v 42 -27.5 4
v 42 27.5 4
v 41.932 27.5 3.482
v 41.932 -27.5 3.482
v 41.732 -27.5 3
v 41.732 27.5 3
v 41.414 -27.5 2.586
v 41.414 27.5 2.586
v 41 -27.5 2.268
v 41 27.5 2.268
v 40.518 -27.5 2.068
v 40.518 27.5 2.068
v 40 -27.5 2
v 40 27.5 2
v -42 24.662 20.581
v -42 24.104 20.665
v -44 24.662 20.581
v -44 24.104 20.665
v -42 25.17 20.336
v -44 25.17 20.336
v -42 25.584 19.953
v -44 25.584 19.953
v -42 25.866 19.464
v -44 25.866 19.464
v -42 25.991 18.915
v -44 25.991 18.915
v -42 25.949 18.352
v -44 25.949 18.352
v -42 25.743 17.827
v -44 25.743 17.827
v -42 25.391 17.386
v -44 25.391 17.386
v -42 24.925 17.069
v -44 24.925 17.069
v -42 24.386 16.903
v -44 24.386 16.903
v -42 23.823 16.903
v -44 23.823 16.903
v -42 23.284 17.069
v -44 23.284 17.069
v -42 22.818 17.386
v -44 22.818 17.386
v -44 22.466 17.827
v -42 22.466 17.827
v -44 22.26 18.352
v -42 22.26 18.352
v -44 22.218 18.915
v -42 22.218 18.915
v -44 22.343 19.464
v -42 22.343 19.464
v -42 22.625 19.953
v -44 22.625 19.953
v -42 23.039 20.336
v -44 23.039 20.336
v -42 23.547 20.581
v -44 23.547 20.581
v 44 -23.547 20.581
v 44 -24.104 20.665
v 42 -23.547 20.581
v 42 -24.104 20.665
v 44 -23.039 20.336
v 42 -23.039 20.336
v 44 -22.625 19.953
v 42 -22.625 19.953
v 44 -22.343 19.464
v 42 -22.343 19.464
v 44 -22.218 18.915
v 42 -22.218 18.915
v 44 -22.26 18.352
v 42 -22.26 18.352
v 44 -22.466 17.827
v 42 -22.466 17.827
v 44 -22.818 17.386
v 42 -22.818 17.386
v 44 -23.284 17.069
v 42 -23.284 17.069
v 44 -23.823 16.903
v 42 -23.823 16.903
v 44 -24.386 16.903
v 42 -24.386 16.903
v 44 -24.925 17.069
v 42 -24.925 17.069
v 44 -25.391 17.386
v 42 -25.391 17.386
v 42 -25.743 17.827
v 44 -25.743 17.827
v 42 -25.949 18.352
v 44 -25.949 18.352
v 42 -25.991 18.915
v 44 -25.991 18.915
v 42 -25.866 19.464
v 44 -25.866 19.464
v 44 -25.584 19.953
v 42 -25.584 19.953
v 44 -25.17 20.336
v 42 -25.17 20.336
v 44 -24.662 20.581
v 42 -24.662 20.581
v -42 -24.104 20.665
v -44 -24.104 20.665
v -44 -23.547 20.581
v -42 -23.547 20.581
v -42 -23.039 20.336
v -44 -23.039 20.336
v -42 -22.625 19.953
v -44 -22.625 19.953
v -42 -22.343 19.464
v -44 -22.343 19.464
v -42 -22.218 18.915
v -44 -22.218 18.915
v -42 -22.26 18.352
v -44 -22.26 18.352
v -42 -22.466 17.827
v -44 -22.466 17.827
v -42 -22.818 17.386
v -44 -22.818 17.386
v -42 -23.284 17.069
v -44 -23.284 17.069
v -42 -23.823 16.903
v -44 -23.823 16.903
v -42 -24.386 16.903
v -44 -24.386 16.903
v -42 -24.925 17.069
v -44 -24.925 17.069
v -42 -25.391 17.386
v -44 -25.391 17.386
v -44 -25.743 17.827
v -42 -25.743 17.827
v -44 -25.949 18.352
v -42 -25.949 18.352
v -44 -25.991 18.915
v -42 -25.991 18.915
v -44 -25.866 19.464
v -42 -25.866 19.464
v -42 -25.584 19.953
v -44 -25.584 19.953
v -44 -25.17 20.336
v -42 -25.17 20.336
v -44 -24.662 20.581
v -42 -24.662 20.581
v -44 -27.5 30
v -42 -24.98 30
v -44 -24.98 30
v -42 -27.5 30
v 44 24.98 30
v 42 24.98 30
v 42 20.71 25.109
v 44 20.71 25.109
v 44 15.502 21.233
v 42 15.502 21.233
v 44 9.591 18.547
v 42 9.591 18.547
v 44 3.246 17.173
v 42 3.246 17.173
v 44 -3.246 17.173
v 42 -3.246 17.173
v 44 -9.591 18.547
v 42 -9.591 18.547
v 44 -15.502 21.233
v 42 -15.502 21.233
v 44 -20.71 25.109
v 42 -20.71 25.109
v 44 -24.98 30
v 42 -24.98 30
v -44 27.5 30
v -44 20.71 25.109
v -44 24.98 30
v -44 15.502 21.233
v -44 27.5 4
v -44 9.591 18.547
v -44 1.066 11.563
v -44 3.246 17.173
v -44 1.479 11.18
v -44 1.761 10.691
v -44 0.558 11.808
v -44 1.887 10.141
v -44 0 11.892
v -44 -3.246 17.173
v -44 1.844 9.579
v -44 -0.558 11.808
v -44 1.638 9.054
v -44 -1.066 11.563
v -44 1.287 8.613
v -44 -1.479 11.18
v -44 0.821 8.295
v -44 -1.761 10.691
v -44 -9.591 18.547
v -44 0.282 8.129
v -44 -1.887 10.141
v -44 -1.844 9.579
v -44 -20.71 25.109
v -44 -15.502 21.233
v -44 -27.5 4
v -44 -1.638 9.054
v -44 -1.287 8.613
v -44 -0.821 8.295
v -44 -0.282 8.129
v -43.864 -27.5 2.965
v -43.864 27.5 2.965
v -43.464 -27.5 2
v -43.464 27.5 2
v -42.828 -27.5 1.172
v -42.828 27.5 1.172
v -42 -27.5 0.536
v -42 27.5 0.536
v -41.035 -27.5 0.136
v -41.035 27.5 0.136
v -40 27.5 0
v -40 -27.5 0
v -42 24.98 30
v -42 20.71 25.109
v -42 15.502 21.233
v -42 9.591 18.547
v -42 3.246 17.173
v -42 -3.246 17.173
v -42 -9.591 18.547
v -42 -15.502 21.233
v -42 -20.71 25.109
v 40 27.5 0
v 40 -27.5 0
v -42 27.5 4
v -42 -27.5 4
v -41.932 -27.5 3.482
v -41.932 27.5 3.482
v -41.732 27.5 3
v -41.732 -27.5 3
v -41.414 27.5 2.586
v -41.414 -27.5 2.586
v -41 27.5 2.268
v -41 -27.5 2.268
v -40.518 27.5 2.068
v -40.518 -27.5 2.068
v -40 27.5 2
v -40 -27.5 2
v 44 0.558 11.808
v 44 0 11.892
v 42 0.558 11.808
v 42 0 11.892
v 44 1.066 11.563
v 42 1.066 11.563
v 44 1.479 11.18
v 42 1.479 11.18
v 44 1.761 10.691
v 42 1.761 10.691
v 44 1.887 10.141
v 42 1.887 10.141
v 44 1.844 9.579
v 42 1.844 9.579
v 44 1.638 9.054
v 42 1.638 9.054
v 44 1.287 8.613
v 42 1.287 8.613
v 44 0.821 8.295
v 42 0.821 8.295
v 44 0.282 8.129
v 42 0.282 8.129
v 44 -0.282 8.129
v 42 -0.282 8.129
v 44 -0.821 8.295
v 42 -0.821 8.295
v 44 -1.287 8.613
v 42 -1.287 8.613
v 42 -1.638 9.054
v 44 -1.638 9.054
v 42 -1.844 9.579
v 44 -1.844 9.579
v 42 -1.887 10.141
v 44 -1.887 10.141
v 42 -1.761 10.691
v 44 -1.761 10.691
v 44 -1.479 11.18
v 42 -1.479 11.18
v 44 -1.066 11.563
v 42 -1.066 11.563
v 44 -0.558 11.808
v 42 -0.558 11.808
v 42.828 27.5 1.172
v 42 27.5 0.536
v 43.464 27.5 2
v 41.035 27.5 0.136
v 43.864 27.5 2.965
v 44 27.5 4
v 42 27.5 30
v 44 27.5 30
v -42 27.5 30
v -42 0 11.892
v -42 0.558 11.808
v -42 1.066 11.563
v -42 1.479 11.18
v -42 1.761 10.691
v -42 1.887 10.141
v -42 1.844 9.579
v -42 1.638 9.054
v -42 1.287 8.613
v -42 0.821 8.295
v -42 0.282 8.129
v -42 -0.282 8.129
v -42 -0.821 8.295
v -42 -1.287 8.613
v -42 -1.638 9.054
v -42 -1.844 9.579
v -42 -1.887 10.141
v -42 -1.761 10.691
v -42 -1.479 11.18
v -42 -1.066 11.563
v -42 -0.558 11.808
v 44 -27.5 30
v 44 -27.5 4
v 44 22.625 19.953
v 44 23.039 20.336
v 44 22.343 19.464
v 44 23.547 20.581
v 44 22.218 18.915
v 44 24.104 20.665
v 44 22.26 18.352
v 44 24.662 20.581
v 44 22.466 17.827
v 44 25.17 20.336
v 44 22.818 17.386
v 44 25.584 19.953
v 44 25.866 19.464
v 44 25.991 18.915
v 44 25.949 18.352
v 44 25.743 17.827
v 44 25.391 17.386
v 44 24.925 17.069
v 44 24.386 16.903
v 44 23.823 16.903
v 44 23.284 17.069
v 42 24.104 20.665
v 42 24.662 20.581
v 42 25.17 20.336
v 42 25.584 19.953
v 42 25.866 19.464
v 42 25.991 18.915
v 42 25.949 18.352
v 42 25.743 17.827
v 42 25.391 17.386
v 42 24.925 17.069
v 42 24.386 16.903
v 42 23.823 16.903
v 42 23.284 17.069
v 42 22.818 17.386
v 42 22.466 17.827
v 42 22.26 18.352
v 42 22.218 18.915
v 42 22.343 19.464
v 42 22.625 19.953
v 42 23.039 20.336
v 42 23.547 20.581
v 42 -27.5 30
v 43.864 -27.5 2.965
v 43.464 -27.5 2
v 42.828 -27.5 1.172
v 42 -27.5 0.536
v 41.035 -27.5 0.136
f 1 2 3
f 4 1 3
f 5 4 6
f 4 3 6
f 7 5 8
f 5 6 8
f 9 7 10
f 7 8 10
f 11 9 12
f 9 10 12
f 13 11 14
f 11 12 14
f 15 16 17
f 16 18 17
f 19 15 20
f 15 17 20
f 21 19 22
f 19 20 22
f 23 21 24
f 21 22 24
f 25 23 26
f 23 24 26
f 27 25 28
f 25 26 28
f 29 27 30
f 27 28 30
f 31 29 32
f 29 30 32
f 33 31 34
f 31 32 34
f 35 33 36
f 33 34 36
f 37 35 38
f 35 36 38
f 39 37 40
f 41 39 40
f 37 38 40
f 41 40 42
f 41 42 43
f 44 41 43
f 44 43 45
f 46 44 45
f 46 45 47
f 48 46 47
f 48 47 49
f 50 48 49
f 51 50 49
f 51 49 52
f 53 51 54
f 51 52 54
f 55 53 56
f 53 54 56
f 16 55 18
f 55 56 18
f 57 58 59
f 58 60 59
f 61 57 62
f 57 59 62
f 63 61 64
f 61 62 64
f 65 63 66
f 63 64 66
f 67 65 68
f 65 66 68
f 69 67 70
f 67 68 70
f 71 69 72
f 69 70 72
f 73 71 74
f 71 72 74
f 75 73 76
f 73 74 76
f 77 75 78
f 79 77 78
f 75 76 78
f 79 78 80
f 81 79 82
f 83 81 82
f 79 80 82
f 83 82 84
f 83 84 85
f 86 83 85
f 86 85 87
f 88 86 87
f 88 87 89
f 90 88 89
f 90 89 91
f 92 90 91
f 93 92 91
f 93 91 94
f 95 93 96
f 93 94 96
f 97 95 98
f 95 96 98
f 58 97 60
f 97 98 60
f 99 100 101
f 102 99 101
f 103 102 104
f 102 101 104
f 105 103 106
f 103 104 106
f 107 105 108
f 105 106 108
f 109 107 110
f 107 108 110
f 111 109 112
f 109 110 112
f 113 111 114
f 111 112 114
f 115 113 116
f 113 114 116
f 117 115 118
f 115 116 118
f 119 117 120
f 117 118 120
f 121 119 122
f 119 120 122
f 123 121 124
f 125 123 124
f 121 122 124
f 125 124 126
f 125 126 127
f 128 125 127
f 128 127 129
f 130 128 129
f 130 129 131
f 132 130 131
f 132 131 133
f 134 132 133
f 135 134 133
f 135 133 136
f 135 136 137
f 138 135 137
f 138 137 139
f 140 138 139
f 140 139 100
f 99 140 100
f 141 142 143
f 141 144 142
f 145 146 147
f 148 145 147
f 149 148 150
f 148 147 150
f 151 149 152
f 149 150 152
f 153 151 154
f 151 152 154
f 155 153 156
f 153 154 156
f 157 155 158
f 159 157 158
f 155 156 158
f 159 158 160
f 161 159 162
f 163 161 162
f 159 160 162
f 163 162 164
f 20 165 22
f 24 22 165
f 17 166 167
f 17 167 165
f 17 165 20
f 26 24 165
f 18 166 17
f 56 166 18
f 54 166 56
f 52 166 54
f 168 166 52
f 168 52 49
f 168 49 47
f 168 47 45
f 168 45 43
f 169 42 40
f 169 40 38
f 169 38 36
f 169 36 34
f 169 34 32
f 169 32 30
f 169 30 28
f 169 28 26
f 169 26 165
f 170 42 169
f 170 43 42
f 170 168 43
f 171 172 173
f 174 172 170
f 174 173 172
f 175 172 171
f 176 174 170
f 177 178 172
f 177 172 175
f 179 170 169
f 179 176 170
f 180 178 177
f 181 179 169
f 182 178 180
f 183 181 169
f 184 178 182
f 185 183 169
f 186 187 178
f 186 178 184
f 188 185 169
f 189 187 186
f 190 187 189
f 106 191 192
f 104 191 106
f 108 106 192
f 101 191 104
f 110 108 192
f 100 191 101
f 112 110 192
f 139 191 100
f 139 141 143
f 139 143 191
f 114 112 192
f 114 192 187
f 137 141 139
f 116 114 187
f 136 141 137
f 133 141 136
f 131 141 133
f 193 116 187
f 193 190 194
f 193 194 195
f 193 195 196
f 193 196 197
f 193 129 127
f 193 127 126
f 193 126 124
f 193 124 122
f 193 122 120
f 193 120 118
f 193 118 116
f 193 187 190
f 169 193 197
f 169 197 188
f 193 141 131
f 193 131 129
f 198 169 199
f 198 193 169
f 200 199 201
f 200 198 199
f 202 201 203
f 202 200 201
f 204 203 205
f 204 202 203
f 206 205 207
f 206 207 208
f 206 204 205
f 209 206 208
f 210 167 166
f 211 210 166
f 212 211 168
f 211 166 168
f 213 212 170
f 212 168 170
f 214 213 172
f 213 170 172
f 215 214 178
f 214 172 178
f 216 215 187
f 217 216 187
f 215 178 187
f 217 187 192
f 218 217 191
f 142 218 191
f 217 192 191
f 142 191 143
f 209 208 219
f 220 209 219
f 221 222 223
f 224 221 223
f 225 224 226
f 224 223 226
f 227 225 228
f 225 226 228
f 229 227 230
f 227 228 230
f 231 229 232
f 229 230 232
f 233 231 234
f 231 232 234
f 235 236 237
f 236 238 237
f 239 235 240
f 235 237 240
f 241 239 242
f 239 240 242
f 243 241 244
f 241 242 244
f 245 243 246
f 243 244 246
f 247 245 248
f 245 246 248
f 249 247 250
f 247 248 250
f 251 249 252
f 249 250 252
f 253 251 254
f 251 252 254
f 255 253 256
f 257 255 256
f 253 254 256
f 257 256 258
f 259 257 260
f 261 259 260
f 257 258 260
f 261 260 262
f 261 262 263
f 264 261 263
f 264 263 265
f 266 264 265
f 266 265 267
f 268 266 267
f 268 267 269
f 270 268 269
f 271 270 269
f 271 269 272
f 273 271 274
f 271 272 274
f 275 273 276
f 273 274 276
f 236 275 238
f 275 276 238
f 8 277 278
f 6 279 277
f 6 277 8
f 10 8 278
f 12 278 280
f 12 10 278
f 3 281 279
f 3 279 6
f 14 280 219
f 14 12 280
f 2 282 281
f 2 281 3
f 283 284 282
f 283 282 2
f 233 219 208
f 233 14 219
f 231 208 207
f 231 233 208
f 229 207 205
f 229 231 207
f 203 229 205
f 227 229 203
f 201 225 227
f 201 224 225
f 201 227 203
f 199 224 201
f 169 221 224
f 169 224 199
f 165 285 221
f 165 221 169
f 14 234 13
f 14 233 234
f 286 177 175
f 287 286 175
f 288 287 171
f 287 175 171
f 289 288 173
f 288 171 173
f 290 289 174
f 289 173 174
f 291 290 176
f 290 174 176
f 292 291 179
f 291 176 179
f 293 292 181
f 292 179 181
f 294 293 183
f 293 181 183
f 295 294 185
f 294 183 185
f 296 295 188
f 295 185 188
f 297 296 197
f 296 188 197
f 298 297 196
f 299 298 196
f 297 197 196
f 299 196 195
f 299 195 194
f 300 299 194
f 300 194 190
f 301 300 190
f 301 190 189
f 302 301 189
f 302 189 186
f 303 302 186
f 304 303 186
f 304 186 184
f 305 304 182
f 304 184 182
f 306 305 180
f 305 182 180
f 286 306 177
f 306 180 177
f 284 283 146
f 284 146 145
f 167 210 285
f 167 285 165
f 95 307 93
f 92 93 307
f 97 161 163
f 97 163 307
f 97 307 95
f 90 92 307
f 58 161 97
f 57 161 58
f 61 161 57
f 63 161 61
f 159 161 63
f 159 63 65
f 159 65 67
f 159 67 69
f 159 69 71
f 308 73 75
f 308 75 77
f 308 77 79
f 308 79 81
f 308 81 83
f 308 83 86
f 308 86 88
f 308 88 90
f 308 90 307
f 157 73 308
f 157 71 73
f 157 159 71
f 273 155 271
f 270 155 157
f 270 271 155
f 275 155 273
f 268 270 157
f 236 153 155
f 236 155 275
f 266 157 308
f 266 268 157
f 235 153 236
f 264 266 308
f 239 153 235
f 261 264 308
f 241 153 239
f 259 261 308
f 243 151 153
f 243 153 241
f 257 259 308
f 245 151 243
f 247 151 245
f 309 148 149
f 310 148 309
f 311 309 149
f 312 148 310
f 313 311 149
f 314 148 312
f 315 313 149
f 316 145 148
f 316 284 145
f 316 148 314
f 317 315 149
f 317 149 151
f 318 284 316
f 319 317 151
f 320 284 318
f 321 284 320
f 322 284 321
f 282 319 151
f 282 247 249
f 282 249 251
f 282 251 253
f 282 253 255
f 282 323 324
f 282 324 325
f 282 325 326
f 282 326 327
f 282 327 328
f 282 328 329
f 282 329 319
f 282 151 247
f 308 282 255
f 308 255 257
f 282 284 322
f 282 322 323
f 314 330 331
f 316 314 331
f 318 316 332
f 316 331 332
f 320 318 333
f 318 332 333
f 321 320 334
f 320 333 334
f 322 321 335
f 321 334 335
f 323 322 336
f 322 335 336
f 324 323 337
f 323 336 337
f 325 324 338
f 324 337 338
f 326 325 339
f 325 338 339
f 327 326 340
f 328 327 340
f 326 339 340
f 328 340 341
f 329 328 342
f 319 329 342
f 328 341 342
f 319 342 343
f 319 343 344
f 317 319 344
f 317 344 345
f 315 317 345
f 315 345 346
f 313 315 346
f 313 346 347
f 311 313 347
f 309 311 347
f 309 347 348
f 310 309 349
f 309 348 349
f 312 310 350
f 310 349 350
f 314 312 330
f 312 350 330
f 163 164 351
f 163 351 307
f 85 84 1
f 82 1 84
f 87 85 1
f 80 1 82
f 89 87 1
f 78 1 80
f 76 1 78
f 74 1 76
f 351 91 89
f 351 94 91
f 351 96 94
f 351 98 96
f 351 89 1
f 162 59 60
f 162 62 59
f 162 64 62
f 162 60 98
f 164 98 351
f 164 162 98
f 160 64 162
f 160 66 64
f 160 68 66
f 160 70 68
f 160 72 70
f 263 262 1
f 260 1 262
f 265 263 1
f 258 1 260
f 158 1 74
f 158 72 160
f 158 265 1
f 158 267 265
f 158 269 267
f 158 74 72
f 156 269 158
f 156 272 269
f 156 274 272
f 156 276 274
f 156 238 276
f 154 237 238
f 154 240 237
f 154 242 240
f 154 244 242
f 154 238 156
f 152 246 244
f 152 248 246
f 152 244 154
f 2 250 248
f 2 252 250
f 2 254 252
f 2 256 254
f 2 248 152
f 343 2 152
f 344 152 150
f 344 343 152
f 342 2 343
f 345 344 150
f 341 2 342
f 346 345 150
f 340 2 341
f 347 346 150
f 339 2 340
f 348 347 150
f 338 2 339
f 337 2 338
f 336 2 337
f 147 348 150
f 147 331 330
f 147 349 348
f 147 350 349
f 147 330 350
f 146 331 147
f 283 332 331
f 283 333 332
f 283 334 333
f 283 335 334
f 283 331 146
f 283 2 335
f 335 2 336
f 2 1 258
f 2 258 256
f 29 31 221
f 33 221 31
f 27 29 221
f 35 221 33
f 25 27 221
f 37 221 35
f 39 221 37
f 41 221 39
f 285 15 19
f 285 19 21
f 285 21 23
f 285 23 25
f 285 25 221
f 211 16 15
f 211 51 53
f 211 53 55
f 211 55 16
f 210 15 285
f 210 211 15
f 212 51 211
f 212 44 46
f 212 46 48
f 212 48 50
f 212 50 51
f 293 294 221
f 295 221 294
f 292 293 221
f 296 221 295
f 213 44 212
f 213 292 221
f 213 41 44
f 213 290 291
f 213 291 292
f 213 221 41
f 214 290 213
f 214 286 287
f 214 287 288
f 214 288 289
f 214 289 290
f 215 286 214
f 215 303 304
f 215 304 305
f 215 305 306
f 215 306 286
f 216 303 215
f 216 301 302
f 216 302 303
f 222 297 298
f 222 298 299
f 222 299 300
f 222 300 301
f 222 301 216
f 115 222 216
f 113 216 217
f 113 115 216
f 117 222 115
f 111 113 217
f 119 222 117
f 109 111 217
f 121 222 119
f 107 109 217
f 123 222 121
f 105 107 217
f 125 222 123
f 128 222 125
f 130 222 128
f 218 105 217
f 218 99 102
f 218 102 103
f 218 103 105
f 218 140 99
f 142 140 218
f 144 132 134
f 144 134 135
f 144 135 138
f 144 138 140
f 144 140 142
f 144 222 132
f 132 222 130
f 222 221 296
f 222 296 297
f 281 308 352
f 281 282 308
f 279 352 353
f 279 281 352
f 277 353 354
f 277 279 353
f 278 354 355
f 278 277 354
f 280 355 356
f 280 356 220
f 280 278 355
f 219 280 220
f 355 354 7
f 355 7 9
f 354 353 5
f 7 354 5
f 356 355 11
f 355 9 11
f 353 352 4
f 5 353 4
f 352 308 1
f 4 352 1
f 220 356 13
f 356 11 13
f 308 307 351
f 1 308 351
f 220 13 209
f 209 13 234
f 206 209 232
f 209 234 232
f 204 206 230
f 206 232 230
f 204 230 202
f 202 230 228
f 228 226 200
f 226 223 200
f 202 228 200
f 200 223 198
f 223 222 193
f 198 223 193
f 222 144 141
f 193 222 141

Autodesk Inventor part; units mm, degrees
ref_plane "YZ Plane" through (0, 0, 0) normal (1, 0, 0) x (0, 1, 0)
ref_plane "XZ Plane" through (0, 0, 0) normal (0, 1, 0) x (-1, 0, 0)
ref_plane "XY Plane" through (0, 0, 0) normal (0, 0, 1) x (1, 0, 0)
sketch "スケッチ2" plane through (0, 0, 0) normal (0, 0, 1) x (1, 0, 0)
  line L0 (44, -27.5) -> (-44, -27.5)
  line L1 (-44, -27.5) -> (-44, 27.5)
  line L2 (-44, 27.5) -> (44, 27.5)
  line L3 (44, 27.5) -> (44, -27.5)
  line L4 (44, -27.5) -> (-44, 27.5) construction
  line L5 (-44, -27.5) -> (44, 27.5) construction
  point P0 (0, 0)
  dimension "d5" = 88
  dimension "d6" = 55
extrude "プレート2" add sketch "スケッチ2" along normal blind 2
sketch "スケッチ3" plane through (42, 27.5, 0) normal (1, 0, 0) x (0, 1, 0)
  line L0 (-55, 0) -> (0, 0)
  line L1 (0, 0) -> (0, 30)
  line L2 (0, 30) -> (-55, 30)
  line L3 (-55, 30) -> (-55, 0)
edge flange "フランジ1" height 30 angle 90 thickness 2 bend radius 2 thickness toward (1, 0, 0) relief tear relief width 2 relief depth 1 corner gap 2 corner form 0 edges at (44, 0, 2) (-44, 0, 2) wall of the first edge with corners at (42, -27.5, 0) (42, 27.5, 0) (42, 27.5, 30) (42, -27.5, 30)
bend "曲げ1"
corner "コーナー1"
sketch "スケッチ5" plane through (-44, -27.5, 30) normal (-1, 0, 0) x (0, 0, 1)
  circle A0 centre (17.5, 27.5) radius 37.5
  circle A1 centre (-11.2267, 3.3955) radius 1.8919
  circle A2 centre (10.9882, -9.4303) radius 1.8919
  circle A3 centre (36.25, -4.976) radius 1.8919
  circle A4 centre (52.7385, 14.6742) radius 1.8919
  circle A5 centre (52.7385, 40.3258) radius 1.8919
  circle A6 centre (36.25, 59.976) radius 1.8919
  circle A7 centre (10.9882, 64.4303) radius 1.8919
  circle A8 centre (-11.2267, 51.6045) radius 1.8919
  circle A9 centre (-20, 27.5) radius 1.8919
  line L0 (-26, 55) -> (-26, 0) projected
  circle A10 centre (17.5, 27.5) radius 30.5
  point P0 (-30, 27.5)
  dimension "d26" = 75
  dimension "d29" = 360
  dimension "d31" = 0
  dimension "d32" = 0
  dimension "d36" = 6
  dimension "d37" = 61
extrude "押し出し1" cut sketch "スケッチ5" against normal up to surface (88 mm away) contours A8 A0 | A0 A8 | A1 A0 | A0 A1 | A9 A0 | A0 A9 | A10
equation "\"d7\" = Thickness"
equation "\"d8\" = BendReliefWidth"
equation "\"d9\" = BendReliefDepth"
equation "\"d10\" = MinimumRemnant"
equation "\"d11\" = TransitionRadius"
equation "\"d14\" = BendRadius"
equation "\"d15\" = CornerReliefSize"
equation "\"d16\" = GapSize"
equation "\"d17\" = JacobiRadiusSize"
equation "\"BendRadius\" = Thickness"
equation "\"BendReliefWidth\" = Thickness"
equation "\"BendReliefDepth\" = 0.5 * Thickness"
equation "\"CornerReliefSize\" = 4 * Thickness"
equation "\"MinimumRemnant\" = 2 * Thickness"
equation "\"TransitionRadius\" = BendRadius"
equation "\"JacobiRadiusSize\" = BendRadius"
equation "\"GapSize\" = Thickness"
equation "\"Thickness\" = 2"
properties part number "servo_arm" material "アルミニウム 5052"
